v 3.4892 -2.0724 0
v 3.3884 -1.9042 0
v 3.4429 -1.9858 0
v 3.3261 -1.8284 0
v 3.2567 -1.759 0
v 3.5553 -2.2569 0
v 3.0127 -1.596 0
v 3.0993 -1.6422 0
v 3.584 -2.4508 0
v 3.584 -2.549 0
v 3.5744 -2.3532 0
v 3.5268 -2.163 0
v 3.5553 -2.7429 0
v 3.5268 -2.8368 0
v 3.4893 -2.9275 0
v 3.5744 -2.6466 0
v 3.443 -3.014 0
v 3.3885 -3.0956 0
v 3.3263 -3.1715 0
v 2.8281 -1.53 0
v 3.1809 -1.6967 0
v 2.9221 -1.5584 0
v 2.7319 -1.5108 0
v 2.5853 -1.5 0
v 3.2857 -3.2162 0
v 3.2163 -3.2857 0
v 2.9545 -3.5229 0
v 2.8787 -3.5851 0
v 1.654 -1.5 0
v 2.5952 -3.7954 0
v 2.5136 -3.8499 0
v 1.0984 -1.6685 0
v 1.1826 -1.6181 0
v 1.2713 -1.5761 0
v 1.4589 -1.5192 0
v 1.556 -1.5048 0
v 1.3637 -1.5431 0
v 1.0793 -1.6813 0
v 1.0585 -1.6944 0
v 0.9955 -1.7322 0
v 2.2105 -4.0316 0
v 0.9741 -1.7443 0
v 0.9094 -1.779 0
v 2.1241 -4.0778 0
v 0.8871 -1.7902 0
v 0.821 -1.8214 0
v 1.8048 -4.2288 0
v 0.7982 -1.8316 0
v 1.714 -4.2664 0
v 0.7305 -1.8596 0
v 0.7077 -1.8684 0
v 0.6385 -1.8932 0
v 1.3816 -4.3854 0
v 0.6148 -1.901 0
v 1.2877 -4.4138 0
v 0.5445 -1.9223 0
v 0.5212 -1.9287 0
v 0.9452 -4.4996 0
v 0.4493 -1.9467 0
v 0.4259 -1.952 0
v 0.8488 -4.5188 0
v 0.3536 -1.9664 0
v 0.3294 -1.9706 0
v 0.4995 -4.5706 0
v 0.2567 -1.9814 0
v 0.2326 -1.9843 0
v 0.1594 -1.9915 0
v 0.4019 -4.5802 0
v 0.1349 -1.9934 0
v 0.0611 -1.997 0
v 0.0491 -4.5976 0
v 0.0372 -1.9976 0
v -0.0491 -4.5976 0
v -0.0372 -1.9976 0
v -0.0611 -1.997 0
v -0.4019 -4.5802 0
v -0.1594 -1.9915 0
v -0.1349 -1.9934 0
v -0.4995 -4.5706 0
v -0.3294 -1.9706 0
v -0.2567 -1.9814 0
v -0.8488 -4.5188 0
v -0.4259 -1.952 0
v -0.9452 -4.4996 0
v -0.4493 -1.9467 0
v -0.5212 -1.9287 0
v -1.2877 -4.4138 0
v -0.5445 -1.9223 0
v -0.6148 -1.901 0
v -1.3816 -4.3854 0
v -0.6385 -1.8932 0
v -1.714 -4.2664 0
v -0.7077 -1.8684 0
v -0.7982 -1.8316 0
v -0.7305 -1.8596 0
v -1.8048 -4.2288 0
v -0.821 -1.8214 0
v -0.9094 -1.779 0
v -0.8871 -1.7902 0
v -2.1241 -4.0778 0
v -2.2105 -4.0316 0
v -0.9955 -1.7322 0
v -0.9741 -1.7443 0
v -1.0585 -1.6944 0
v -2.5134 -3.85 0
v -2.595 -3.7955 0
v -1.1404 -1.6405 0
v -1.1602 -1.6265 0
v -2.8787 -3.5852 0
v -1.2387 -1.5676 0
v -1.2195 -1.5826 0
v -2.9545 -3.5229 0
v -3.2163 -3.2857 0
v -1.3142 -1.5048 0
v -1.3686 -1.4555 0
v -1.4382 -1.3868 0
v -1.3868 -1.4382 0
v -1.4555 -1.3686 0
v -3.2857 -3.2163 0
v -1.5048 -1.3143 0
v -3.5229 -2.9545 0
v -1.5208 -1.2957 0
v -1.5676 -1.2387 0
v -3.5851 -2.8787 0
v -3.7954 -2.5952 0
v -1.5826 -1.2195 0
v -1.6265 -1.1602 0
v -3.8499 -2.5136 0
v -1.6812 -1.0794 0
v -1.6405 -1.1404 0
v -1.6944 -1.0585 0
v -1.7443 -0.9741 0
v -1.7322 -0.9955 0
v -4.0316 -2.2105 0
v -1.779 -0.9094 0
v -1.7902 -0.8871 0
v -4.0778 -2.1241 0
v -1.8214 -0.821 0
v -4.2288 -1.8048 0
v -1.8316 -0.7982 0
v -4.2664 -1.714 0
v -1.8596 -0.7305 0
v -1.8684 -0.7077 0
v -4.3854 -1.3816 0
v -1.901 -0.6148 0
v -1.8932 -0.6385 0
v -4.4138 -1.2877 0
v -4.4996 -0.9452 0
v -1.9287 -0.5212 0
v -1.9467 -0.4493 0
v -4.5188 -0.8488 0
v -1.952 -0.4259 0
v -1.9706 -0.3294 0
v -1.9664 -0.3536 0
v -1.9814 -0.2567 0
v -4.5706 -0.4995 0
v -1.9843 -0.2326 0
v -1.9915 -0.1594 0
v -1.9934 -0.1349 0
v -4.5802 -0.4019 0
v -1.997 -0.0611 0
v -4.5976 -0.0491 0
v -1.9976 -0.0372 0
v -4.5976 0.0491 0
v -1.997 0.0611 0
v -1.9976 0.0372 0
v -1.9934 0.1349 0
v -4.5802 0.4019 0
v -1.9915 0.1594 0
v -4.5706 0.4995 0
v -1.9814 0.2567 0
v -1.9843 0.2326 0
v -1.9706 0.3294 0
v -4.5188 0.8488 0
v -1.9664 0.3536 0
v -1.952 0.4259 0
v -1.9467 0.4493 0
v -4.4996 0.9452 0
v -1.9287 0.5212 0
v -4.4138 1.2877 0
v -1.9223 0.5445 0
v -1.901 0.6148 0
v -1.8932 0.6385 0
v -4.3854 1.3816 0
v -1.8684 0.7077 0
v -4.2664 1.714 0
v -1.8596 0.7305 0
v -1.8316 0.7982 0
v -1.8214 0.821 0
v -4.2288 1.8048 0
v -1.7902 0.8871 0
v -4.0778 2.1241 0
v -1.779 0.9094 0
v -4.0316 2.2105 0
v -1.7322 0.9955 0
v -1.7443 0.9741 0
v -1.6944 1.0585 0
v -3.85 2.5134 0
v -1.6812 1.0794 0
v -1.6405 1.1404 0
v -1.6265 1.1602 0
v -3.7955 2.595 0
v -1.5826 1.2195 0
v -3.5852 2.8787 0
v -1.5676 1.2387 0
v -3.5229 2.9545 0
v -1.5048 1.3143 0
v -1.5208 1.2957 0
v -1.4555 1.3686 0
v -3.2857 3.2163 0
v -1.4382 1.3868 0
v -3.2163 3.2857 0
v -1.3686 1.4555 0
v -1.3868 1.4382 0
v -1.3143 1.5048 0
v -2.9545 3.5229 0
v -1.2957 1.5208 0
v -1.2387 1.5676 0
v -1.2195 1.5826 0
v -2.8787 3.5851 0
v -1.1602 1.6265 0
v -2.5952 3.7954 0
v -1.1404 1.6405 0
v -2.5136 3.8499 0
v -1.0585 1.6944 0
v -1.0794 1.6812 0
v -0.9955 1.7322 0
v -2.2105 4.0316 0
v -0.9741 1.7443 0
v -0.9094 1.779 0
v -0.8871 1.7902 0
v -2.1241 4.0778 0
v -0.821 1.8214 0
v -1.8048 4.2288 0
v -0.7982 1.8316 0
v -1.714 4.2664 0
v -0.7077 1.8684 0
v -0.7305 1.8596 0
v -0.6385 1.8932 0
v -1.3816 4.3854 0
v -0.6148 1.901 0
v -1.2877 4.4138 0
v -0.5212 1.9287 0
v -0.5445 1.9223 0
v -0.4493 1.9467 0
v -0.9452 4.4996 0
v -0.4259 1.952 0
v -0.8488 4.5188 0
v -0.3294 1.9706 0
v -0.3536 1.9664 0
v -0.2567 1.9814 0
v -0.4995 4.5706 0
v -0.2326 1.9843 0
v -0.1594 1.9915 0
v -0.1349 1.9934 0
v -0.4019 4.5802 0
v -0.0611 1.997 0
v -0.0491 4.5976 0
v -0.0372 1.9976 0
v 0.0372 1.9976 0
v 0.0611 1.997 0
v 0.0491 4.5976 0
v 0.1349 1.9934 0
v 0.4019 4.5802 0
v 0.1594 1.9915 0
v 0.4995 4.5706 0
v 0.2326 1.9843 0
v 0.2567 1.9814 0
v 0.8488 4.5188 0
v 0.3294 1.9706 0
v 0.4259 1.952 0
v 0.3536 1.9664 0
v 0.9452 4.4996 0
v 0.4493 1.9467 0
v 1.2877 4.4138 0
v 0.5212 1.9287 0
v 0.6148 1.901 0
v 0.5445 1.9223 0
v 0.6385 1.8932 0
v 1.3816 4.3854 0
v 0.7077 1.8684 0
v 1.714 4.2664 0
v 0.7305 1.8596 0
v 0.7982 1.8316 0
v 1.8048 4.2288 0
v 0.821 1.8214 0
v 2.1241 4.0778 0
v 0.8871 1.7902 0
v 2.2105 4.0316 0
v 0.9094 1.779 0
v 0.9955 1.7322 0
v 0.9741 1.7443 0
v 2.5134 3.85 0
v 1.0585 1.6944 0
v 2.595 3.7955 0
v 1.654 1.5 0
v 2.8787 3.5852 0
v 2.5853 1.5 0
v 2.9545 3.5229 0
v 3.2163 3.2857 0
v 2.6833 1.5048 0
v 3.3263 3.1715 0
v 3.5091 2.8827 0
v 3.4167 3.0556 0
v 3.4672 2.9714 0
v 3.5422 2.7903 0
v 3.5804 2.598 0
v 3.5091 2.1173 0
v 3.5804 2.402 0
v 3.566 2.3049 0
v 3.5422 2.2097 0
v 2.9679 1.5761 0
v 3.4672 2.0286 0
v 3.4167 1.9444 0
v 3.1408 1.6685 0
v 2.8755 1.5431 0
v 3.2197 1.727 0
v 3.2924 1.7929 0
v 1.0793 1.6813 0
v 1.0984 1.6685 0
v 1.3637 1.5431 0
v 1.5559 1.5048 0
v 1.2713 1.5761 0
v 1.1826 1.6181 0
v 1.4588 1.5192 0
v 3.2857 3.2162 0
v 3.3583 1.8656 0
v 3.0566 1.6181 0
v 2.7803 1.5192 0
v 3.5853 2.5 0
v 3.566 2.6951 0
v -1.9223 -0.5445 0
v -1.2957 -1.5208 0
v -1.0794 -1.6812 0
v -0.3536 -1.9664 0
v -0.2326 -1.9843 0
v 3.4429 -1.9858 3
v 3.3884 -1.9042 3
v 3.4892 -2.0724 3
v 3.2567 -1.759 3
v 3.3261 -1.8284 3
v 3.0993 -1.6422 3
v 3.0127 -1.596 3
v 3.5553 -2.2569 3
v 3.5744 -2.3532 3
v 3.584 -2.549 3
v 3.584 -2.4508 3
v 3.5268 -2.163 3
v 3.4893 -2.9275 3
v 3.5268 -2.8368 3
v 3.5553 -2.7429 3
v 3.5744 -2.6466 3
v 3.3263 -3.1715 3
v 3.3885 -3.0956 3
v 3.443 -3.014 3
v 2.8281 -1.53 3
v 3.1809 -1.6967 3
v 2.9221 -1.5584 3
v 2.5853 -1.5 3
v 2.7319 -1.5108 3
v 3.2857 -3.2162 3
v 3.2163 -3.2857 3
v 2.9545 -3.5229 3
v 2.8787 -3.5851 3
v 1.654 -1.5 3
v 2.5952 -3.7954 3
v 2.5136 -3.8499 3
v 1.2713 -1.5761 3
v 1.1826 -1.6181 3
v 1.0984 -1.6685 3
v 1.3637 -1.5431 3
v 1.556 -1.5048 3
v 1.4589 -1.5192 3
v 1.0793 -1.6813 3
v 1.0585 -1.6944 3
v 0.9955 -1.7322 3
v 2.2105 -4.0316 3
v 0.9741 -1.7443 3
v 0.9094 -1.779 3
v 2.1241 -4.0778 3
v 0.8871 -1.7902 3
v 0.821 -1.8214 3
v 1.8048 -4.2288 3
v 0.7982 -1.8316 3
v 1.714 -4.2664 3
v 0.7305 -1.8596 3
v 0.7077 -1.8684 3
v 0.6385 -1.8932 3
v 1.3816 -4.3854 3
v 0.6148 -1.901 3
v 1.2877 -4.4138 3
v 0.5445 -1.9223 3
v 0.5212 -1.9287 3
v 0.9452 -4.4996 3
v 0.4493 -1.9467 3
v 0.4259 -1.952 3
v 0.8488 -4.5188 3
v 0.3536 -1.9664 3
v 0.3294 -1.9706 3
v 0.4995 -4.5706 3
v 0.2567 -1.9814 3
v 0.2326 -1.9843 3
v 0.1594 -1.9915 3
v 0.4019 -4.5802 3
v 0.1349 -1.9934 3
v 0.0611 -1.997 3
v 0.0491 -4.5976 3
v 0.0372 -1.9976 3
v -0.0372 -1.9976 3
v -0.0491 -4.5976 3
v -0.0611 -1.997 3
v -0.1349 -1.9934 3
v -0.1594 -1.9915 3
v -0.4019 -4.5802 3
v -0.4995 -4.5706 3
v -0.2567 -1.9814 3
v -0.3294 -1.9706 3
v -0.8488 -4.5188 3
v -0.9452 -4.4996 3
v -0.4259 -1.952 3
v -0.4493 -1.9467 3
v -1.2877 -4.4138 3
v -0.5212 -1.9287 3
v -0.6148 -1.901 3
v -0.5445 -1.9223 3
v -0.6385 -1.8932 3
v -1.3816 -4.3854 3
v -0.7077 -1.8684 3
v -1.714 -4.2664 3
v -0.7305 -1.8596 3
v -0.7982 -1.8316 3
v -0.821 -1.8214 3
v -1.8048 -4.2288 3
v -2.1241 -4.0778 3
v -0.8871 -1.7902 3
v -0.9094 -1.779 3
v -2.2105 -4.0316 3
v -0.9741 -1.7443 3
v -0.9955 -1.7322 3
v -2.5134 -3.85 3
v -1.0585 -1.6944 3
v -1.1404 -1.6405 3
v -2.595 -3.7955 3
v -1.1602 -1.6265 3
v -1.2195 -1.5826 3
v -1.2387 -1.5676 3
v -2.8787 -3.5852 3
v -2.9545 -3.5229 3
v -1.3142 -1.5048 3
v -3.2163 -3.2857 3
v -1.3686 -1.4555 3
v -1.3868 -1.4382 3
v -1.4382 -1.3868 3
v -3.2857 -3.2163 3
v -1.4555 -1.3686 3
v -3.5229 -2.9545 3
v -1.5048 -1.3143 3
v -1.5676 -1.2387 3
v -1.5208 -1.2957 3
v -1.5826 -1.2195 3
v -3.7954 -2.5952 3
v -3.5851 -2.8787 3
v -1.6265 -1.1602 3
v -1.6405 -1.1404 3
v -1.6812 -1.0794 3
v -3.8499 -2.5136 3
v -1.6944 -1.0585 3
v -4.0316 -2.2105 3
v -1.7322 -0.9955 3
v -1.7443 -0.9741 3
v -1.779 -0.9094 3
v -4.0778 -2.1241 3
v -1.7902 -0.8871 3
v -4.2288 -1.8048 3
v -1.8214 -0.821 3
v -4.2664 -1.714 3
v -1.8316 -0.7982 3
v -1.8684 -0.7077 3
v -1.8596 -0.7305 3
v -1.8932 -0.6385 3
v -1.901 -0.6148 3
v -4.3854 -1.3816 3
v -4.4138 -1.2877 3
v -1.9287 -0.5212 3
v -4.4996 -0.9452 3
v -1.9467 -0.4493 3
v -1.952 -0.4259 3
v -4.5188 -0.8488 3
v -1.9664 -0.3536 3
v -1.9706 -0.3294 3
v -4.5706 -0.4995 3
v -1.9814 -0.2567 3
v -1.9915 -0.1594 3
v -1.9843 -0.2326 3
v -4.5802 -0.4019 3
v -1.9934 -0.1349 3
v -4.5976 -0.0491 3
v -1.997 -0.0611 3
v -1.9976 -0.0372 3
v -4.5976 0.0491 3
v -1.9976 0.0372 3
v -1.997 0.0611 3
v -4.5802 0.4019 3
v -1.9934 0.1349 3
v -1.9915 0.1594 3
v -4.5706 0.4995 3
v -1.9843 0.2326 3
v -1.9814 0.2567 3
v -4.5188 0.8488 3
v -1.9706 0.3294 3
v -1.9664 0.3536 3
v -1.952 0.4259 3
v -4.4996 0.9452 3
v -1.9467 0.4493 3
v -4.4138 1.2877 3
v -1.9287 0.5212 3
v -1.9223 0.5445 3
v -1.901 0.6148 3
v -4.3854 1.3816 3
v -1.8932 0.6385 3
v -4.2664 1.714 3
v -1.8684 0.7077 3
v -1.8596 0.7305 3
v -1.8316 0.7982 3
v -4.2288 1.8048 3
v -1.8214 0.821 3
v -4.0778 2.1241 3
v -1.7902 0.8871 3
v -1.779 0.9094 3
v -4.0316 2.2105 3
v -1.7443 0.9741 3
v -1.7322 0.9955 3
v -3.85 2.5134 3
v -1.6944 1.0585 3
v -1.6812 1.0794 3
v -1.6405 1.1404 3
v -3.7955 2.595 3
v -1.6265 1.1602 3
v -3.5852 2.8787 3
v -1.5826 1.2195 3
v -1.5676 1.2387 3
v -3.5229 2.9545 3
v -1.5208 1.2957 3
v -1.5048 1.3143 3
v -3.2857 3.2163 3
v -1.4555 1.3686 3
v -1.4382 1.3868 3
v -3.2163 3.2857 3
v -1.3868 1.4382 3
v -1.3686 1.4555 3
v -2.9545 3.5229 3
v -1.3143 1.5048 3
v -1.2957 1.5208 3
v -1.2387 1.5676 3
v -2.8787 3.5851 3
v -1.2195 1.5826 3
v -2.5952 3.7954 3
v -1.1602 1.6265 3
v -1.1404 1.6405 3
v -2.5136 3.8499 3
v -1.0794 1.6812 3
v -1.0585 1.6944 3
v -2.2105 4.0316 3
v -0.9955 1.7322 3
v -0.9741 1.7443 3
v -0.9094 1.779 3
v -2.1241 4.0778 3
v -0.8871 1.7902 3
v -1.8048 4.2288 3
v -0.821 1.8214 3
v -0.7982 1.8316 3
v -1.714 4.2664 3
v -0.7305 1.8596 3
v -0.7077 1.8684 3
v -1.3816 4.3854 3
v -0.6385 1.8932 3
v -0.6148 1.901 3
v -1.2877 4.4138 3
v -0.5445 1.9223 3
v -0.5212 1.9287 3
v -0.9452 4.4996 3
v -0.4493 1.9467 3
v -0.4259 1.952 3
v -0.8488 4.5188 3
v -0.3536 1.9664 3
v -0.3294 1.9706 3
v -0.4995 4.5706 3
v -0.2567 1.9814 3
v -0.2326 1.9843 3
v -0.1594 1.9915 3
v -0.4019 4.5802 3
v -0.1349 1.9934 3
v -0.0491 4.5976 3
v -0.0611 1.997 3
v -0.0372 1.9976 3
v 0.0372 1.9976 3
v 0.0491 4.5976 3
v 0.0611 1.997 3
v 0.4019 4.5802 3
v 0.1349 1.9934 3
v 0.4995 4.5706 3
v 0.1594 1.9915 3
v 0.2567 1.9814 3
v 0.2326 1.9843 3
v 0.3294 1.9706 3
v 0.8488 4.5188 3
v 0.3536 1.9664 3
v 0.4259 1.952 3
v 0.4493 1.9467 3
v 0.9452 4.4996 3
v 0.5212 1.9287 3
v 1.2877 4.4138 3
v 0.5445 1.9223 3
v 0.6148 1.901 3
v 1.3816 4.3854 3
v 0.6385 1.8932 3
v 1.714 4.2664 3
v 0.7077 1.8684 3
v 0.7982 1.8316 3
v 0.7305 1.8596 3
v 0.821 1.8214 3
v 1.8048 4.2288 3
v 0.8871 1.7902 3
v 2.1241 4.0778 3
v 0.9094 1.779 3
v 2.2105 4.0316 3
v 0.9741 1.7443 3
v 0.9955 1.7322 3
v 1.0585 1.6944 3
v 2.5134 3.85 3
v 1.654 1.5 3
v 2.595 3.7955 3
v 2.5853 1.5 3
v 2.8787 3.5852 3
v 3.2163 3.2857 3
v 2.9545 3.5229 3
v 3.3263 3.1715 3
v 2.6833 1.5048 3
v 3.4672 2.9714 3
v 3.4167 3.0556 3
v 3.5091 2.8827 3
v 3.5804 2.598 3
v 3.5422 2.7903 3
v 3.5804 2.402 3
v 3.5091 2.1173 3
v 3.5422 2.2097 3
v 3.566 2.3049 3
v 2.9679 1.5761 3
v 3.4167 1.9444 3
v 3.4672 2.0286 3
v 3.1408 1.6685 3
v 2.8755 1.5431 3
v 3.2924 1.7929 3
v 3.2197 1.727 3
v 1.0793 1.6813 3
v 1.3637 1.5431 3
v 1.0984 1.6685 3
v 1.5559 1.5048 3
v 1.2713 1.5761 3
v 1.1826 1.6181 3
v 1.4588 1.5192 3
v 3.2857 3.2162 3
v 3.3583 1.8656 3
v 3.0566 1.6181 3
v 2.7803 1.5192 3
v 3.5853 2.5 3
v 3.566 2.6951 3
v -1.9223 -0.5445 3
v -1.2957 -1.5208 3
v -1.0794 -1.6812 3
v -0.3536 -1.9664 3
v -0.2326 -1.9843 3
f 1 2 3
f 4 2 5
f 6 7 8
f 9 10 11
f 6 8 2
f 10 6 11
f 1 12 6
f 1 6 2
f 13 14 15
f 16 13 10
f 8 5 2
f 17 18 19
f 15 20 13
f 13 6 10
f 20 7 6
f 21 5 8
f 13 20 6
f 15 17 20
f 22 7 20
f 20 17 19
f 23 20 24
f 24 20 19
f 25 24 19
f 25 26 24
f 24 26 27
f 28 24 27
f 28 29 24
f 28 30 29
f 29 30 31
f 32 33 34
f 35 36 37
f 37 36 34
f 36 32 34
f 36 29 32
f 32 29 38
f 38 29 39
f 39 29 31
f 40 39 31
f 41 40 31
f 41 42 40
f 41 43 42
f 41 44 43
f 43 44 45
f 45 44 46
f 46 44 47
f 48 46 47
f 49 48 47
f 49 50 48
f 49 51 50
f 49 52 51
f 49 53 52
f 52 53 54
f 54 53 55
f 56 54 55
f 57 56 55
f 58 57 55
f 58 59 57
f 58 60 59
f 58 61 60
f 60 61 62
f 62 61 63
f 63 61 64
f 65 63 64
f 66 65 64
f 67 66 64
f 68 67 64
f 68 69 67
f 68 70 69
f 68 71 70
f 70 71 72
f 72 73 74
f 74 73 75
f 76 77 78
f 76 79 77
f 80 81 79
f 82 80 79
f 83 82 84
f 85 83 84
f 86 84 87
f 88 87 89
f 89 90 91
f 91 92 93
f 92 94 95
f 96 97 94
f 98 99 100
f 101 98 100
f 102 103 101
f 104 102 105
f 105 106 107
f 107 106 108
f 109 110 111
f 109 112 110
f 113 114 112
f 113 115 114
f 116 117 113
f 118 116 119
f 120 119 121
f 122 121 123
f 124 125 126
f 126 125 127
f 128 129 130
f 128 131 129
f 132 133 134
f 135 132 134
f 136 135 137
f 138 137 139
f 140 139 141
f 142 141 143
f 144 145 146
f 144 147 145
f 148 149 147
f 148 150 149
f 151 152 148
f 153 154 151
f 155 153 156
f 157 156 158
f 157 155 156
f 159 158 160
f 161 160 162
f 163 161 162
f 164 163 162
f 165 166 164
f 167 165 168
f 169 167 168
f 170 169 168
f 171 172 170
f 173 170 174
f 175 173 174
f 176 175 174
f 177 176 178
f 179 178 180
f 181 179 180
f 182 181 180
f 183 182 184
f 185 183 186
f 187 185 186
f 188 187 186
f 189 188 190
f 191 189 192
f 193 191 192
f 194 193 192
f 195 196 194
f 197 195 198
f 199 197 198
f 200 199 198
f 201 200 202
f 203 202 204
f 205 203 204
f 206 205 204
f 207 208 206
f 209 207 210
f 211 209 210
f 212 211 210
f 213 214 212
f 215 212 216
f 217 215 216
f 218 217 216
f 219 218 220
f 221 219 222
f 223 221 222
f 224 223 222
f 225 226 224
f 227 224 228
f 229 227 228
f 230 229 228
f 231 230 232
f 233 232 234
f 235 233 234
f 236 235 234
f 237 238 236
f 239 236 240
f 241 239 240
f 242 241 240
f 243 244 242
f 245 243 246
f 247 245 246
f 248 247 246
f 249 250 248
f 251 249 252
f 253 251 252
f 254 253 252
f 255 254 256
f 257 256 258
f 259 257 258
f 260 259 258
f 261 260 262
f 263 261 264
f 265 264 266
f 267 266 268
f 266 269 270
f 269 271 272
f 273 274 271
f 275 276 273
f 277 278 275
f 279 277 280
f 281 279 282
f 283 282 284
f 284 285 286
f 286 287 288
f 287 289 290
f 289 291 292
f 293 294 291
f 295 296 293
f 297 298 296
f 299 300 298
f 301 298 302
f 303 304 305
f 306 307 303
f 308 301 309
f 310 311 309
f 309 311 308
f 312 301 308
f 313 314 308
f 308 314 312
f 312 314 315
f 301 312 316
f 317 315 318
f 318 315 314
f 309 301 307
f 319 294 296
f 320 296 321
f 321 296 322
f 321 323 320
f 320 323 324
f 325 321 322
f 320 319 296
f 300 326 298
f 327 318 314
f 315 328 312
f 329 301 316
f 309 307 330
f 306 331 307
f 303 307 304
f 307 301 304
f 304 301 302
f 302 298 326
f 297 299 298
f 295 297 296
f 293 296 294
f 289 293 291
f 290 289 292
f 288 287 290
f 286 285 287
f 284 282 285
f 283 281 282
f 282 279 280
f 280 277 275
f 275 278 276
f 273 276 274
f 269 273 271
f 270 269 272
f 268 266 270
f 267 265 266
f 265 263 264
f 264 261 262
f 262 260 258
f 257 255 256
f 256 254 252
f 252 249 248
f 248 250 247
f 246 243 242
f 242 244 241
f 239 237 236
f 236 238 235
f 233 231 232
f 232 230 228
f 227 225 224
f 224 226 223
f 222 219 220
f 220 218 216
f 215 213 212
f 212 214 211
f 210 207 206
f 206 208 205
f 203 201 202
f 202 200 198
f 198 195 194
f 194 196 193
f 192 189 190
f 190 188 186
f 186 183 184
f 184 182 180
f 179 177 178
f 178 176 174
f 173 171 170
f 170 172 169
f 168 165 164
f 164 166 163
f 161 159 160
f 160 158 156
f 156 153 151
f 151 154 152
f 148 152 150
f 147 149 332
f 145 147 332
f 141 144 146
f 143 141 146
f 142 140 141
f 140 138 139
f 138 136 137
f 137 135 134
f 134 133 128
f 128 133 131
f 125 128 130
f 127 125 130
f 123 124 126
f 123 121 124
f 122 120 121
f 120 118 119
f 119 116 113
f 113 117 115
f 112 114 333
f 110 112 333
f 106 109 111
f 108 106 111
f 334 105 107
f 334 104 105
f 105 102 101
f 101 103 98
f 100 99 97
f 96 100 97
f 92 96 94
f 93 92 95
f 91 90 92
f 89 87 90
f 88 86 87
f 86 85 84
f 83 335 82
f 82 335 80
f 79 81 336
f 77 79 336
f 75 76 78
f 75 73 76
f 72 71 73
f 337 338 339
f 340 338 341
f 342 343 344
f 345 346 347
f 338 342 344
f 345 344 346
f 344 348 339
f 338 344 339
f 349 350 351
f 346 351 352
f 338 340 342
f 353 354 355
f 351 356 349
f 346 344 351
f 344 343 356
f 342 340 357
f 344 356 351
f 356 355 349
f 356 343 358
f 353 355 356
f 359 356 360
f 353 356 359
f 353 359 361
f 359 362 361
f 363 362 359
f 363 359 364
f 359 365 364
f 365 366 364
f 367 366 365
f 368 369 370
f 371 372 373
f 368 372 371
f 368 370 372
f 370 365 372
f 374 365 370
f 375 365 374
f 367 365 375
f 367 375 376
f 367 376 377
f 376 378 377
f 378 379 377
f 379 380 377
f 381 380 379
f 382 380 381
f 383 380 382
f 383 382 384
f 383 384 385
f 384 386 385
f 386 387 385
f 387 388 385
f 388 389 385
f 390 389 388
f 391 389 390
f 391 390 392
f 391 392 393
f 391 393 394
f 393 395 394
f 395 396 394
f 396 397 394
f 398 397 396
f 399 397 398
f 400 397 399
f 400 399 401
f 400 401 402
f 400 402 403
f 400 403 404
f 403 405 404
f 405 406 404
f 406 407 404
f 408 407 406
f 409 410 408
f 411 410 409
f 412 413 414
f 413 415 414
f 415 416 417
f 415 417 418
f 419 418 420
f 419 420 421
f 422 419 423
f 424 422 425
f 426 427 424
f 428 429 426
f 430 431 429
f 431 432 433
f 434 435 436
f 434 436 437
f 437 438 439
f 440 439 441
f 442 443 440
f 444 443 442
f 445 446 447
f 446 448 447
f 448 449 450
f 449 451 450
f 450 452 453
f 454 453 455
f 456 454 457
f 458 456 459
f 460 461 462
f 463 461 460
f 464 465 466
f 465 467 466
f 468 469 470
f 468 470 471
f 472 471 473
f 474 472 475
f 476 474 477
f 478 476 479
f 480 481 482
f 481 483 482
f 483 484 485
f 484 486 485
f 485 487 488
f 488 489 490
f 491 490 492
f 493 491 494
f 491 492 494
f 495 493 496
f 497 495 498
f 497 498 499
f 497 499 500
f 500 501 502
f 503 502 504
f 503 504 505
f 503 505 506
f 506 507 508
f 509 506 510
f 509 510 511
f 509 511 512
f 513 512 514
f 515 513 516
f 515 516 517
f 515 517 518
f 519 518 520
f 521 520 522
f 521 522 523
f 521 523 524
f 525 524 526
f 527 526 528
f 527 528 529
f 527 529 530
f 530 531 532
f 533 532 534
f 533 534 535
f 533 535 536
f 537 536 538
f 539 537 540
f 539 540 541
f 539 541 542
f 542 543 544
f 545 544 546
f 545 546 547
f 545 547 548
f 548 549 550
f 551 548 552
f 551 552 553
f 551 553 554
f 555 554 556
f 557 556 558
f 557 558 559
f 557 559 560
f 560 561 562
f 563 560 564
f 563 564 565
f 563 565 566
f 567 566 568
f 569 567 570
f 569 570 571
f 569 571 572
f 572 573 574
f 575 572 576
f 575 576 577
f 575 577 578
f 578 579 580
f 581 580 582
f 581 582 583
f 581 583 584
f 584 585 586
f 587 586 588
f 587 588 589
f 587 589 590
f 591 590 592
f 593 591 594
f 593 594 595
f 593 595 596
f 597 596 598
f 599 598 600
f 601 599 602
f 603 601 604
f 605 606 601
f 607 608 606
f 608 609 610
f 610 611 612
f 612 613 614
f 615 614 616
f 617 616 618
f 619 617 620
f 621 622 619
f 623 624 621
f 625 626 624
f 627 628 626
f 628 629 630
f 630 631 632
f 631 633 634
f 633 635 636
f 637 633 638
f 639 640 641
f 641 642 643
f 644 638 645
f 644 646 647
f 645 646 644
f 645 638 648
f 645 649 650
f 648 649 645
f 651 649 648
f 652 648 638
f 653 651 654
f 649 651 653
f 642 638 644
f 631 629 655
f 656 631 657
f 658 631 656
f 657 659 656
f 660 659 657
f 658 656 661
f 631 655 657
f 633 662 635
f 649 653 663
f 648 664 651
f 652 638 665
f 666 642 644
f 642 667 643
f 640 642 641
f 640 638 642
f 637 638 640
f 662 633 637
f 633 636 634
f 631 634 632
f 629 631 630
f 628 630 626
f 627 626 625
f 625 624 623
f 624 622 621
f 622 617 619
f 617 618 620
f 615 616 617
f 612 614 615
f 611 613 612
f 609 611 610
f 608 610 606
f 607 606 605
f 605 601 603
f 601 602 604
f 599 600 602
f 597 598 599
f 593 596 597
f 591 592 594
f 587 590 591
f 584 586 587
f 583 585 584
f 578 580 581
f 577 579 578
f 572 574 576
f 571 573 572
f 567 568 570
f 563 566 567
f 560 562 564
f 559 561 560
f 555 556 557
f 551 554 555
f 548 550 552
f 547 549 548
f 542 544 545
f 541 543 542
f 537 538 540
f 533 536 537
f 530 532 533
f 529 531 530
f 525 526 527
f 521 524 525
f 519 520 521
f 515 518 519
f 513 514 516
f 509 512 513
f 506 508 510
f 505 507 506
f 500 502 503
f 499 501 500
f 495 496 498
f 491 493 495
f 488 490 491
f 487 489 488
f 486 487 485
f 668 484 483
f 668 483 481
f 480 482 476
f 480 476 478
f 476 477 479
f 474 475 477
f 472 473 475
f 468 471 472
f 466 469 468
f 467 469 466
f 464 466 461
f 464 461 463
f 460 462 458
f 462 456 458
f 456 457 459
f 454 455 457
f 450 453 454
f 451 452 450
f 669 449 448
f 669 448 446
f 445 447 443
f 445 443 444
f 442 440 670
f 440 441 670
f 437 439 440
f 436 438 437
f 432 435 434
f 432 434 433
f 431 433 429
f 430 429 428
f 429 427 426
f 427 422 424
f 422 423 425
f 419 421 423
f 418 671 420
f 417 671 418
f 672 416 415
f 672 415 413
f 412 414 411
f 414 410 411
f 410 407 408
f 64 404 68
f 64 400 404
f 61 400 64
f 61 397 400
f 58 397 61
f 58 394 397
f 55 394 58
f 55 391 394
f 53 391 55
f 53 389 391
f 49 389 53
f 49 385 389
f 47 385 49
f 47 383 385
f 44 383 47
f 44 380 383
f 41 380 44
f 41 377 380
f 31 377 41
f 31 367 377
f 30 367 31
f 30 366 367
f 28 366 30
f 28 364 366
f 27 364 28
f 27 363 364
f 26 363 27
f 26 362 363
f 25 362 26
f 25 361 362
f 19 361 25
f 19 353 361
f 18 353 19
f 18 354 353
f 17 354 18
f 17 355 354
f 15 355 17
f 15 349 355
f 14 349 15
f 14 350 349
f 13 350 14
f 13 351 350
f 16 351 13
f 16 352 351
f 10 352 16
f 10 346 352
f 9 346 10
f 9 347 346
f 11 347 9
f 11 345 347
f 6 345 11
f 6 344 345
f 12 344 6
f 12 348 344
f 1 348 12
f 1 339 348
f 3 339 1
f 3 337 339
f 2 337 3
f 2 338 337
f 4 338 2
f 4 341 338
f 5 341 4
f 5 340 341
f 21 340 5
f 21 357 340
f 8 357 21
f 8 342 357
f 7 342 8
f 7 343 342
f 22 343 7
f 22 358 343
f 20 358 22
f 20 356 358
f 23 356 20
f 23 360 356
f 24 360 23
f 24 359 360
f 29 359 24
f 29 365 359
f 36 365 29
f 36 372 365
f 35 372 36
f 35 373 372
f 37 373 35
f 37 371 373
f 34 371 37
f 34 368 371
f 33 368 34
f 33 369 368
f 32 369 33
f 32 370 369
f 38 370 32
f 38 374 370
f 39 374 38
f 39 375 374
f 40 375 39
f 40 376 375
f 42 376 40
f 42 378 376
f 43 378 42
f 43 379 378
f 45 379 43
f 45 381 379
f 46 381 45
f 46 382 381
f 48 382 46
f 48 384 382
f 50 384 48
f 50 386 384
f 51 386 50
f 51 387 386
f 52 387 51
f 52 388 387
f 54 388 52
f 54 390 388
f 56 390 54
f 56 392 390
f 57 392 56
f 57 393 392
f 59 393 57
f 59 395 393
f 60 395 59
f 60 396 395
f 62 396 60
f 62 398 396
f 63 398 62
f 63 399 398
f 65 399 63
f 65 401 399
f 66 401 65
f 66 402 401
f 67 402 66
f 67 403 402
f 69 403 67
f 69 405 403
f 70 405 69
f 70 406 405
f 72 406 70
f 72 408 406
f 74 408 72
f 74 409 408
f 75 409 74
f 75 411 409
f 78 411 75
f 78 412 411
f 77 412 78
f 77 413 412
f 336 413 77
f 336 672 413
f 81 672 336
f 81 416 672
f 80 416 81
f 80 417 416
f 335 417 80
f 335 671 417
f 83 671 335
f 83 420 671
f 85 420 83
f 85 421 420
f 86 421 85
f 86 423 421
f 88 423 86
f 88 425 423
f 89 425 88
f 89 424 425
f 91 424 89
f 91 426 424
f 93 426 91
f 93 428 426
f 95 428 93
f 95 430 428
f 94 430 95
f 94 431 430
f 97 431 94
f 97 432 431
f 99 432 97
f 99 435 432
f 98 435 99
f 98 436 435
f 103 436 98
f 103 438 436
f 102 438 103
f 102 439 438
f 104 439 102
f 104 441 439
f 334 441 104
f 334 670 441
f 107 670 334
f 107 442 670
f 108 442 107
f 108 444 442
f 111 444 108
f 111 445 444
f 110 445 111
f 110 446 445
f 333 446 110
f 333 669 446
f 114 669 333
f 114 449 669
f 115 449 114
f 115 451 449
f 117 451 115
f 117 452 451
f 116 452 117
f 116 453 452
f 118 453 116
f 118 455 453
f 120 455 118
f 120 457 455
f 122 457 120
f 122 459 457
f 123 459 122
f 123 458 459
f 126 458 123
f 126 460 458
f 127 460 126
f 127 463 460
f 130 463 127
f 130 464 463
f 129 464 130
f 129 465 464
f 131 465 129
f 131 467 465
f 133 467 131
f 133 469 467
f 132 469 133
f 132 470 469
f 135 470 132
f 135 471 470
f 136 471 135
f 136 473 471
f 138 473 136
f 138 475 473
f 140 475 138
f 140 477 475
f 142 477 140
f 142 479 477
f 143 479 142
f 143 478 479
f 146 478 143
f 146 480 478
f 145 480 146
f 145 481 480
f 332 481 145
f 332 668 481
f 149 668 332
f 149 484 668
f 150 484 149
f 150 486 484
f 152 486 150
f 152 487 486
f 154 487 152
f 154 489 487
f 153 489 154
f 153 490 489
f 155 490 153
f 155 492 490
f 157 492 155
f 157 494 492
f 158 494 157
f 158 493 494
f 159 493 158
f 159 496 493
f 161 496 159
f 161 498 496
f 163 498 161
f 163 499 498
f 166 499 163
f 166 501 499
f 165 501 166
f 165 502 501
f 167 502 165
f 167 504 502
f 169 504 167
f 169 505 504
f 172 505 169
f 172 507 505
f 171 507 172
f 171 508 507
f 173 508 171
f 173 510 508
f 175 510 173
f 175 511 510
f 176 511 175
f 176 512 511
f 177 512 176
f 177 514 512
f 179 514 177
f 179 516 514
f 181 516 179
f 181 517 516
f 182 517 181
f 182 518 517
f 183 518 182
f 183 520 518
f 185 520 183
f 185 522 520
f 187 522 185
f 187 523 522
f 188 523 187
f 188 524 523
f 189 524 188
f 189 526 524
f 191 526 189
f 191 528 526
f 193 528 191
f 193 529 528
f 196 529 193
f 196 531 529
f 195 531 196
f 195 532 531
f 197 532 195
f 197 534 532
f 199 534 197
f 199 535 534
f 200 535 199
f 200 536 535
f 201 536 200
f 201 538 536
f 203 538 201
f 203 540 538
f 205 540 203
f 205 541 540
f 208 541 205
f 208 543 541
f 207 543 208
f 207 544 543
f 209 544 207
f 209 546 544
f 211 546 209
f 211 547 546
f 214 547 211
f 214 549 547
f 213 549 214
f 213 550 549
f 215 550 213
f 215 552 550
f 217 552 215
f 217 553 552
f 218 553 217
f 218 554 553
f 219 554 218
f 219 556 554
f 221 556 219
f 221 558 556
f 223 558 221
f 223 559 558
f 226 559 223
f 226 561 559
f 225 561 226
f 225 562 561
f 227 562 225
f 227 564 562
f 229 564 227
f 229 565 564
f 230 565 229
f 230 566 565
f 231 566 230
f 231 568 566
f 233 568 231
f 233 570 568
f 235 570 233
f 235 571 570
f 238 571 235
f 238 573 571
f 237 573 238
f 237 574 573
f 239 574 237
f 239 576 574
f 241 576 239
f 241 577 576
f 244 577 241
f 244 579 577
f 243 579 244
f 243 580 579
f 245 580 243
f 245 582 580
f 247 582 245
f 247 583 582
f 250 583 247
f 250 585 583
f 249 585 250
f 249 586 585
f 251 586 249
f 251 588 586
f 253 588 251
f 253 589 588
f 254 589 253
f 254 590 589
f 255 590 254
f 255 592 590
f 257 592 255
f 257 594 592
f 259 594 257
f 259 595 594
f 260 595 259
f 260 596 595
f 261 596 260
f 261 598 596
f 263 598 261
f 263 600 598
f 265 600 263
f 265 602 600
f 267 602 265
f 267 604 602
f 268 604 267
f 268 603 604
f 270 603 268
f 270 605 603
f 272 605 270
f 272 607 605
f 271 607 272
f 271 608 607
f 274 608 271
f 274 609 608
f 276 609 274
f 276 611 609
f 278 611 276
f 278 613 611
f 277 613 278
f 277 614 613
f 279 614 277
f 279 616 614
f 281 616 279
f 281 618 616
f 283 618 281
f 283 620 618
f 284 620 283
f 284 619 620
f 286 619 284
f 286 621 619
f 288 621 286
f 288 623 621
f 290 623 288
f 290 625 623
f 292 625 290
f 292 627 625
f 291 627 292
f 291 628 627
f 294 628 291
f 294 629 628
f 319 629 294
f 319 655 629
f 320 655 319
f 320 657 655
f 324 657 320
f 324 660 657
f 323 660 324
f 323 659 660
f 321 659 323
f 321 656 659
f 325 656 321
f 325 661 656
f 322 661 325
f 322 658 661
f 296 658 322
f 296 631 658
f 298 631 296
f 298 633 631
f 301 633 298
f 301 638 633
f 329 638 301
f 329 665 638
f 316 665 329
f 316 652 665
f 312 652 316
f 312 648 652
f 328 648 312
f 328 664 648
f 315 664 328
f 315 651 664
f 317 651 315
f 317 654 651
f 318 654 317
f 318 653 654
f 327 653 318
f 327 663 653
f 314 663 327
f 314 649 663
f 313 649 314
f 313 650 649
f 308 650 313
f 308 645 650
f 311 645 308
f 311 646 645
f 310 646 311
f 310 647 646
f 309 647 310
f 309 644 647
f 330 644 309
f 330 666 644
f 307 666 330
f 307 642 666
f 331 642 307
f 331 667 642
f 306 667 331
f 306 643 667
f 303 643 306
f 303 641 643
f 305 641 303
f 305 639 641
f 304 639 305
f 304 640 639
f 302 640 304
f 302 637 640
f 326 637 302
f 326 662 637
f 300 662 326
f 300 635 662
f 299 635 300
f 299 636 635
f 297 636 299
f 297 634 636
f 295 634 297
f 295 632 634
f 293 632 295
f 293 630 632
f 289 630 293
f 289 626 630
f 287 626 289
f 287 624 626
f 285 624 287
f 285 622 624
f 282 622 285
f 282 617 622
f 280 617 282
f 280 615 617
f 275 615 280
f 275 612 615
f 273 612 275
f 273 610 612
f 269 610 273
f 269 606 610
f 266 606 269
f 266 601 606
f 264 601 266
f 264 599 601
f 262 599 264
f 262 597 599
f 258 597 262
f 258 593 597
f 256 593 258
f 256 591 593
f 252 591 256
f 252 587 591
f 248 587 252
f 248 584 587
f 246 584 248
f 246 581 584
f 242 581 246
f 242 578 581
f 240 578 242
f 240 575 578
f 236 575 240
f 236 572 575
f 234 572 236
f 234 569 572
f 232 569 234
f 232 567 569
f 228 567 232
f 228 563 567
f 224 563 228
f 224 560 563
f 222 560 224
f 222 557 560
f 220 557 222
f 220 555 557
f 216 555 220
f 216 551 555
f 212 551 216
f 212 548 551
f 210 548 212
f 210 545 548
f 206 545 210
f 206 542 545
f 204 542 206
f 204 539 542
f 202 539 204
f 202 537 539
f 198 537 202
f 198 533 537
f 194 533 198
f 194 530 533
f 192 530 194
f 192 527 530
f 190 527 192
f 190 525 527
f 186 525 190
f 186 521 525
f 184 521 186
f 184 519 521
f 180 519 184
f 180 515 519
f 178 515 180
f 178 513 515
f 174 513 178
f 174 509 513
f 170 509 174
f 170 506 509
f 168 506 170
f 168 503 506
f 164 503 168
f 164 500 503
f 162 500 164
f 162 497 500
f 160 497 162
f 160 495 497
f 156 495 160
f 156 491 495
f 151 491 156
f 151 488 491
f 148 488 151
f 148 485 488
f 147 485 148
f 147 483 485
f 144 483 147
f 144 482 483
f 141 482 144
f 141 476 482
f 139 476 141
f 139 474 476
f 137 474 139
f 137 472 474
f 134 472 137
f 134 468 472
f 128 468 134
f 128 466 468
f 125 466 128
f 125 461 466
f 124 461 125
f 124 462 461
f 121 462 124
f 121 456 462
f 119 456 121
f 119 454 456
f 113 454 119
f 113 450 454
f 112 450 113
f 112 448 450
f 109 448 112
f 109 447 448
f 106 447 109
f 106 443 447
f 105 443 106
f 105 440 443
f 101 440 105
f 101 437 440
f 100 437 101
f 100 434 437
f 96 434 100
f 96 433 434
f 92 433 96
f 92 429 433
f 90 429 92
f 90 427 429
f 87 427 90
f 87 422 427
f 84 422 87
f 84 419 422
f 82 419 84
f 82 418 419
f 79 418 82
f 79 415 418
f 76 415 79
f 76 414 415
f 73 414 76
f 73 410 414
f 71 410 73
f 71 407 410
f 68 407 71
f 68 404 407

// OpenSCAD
$fn = 64;

// 7.4: 
// * Two endcaps (DONE)
// * One spacer (DONE)
// 3.6: Two endcaps (DONE)
// 6.0: One spacer (DONE)
// 3.0: Two spacers

thing_h = 3.0;
is_spacer=true;

rod_dia = 4.0;
wall_thick = 2.6;
clip_gap = 3.0;
clip_rounding = 1.0;

union() {
    linear_extrude(thing_h) {
        offset(clip_rounding) offset(-clip_rounding)
        offset(-clip_rounding) offset(clip_rounding)
        difference() {
        circle(d=rod_dia+2*wall_thick);
        circle(d=rod_dia);
        if (is_spacer) {
            translate([rod_dia,0])
            #square([rod_dia/2+wall_thick*2, clip_gap], center=true);
        }
        }
    }
    if (!is_spacer) {
        translate([0,0,thing_h])
        linear_extrude(wall_thick)
        circle(d=rod_dia+2*wall_thick);
    }
}
